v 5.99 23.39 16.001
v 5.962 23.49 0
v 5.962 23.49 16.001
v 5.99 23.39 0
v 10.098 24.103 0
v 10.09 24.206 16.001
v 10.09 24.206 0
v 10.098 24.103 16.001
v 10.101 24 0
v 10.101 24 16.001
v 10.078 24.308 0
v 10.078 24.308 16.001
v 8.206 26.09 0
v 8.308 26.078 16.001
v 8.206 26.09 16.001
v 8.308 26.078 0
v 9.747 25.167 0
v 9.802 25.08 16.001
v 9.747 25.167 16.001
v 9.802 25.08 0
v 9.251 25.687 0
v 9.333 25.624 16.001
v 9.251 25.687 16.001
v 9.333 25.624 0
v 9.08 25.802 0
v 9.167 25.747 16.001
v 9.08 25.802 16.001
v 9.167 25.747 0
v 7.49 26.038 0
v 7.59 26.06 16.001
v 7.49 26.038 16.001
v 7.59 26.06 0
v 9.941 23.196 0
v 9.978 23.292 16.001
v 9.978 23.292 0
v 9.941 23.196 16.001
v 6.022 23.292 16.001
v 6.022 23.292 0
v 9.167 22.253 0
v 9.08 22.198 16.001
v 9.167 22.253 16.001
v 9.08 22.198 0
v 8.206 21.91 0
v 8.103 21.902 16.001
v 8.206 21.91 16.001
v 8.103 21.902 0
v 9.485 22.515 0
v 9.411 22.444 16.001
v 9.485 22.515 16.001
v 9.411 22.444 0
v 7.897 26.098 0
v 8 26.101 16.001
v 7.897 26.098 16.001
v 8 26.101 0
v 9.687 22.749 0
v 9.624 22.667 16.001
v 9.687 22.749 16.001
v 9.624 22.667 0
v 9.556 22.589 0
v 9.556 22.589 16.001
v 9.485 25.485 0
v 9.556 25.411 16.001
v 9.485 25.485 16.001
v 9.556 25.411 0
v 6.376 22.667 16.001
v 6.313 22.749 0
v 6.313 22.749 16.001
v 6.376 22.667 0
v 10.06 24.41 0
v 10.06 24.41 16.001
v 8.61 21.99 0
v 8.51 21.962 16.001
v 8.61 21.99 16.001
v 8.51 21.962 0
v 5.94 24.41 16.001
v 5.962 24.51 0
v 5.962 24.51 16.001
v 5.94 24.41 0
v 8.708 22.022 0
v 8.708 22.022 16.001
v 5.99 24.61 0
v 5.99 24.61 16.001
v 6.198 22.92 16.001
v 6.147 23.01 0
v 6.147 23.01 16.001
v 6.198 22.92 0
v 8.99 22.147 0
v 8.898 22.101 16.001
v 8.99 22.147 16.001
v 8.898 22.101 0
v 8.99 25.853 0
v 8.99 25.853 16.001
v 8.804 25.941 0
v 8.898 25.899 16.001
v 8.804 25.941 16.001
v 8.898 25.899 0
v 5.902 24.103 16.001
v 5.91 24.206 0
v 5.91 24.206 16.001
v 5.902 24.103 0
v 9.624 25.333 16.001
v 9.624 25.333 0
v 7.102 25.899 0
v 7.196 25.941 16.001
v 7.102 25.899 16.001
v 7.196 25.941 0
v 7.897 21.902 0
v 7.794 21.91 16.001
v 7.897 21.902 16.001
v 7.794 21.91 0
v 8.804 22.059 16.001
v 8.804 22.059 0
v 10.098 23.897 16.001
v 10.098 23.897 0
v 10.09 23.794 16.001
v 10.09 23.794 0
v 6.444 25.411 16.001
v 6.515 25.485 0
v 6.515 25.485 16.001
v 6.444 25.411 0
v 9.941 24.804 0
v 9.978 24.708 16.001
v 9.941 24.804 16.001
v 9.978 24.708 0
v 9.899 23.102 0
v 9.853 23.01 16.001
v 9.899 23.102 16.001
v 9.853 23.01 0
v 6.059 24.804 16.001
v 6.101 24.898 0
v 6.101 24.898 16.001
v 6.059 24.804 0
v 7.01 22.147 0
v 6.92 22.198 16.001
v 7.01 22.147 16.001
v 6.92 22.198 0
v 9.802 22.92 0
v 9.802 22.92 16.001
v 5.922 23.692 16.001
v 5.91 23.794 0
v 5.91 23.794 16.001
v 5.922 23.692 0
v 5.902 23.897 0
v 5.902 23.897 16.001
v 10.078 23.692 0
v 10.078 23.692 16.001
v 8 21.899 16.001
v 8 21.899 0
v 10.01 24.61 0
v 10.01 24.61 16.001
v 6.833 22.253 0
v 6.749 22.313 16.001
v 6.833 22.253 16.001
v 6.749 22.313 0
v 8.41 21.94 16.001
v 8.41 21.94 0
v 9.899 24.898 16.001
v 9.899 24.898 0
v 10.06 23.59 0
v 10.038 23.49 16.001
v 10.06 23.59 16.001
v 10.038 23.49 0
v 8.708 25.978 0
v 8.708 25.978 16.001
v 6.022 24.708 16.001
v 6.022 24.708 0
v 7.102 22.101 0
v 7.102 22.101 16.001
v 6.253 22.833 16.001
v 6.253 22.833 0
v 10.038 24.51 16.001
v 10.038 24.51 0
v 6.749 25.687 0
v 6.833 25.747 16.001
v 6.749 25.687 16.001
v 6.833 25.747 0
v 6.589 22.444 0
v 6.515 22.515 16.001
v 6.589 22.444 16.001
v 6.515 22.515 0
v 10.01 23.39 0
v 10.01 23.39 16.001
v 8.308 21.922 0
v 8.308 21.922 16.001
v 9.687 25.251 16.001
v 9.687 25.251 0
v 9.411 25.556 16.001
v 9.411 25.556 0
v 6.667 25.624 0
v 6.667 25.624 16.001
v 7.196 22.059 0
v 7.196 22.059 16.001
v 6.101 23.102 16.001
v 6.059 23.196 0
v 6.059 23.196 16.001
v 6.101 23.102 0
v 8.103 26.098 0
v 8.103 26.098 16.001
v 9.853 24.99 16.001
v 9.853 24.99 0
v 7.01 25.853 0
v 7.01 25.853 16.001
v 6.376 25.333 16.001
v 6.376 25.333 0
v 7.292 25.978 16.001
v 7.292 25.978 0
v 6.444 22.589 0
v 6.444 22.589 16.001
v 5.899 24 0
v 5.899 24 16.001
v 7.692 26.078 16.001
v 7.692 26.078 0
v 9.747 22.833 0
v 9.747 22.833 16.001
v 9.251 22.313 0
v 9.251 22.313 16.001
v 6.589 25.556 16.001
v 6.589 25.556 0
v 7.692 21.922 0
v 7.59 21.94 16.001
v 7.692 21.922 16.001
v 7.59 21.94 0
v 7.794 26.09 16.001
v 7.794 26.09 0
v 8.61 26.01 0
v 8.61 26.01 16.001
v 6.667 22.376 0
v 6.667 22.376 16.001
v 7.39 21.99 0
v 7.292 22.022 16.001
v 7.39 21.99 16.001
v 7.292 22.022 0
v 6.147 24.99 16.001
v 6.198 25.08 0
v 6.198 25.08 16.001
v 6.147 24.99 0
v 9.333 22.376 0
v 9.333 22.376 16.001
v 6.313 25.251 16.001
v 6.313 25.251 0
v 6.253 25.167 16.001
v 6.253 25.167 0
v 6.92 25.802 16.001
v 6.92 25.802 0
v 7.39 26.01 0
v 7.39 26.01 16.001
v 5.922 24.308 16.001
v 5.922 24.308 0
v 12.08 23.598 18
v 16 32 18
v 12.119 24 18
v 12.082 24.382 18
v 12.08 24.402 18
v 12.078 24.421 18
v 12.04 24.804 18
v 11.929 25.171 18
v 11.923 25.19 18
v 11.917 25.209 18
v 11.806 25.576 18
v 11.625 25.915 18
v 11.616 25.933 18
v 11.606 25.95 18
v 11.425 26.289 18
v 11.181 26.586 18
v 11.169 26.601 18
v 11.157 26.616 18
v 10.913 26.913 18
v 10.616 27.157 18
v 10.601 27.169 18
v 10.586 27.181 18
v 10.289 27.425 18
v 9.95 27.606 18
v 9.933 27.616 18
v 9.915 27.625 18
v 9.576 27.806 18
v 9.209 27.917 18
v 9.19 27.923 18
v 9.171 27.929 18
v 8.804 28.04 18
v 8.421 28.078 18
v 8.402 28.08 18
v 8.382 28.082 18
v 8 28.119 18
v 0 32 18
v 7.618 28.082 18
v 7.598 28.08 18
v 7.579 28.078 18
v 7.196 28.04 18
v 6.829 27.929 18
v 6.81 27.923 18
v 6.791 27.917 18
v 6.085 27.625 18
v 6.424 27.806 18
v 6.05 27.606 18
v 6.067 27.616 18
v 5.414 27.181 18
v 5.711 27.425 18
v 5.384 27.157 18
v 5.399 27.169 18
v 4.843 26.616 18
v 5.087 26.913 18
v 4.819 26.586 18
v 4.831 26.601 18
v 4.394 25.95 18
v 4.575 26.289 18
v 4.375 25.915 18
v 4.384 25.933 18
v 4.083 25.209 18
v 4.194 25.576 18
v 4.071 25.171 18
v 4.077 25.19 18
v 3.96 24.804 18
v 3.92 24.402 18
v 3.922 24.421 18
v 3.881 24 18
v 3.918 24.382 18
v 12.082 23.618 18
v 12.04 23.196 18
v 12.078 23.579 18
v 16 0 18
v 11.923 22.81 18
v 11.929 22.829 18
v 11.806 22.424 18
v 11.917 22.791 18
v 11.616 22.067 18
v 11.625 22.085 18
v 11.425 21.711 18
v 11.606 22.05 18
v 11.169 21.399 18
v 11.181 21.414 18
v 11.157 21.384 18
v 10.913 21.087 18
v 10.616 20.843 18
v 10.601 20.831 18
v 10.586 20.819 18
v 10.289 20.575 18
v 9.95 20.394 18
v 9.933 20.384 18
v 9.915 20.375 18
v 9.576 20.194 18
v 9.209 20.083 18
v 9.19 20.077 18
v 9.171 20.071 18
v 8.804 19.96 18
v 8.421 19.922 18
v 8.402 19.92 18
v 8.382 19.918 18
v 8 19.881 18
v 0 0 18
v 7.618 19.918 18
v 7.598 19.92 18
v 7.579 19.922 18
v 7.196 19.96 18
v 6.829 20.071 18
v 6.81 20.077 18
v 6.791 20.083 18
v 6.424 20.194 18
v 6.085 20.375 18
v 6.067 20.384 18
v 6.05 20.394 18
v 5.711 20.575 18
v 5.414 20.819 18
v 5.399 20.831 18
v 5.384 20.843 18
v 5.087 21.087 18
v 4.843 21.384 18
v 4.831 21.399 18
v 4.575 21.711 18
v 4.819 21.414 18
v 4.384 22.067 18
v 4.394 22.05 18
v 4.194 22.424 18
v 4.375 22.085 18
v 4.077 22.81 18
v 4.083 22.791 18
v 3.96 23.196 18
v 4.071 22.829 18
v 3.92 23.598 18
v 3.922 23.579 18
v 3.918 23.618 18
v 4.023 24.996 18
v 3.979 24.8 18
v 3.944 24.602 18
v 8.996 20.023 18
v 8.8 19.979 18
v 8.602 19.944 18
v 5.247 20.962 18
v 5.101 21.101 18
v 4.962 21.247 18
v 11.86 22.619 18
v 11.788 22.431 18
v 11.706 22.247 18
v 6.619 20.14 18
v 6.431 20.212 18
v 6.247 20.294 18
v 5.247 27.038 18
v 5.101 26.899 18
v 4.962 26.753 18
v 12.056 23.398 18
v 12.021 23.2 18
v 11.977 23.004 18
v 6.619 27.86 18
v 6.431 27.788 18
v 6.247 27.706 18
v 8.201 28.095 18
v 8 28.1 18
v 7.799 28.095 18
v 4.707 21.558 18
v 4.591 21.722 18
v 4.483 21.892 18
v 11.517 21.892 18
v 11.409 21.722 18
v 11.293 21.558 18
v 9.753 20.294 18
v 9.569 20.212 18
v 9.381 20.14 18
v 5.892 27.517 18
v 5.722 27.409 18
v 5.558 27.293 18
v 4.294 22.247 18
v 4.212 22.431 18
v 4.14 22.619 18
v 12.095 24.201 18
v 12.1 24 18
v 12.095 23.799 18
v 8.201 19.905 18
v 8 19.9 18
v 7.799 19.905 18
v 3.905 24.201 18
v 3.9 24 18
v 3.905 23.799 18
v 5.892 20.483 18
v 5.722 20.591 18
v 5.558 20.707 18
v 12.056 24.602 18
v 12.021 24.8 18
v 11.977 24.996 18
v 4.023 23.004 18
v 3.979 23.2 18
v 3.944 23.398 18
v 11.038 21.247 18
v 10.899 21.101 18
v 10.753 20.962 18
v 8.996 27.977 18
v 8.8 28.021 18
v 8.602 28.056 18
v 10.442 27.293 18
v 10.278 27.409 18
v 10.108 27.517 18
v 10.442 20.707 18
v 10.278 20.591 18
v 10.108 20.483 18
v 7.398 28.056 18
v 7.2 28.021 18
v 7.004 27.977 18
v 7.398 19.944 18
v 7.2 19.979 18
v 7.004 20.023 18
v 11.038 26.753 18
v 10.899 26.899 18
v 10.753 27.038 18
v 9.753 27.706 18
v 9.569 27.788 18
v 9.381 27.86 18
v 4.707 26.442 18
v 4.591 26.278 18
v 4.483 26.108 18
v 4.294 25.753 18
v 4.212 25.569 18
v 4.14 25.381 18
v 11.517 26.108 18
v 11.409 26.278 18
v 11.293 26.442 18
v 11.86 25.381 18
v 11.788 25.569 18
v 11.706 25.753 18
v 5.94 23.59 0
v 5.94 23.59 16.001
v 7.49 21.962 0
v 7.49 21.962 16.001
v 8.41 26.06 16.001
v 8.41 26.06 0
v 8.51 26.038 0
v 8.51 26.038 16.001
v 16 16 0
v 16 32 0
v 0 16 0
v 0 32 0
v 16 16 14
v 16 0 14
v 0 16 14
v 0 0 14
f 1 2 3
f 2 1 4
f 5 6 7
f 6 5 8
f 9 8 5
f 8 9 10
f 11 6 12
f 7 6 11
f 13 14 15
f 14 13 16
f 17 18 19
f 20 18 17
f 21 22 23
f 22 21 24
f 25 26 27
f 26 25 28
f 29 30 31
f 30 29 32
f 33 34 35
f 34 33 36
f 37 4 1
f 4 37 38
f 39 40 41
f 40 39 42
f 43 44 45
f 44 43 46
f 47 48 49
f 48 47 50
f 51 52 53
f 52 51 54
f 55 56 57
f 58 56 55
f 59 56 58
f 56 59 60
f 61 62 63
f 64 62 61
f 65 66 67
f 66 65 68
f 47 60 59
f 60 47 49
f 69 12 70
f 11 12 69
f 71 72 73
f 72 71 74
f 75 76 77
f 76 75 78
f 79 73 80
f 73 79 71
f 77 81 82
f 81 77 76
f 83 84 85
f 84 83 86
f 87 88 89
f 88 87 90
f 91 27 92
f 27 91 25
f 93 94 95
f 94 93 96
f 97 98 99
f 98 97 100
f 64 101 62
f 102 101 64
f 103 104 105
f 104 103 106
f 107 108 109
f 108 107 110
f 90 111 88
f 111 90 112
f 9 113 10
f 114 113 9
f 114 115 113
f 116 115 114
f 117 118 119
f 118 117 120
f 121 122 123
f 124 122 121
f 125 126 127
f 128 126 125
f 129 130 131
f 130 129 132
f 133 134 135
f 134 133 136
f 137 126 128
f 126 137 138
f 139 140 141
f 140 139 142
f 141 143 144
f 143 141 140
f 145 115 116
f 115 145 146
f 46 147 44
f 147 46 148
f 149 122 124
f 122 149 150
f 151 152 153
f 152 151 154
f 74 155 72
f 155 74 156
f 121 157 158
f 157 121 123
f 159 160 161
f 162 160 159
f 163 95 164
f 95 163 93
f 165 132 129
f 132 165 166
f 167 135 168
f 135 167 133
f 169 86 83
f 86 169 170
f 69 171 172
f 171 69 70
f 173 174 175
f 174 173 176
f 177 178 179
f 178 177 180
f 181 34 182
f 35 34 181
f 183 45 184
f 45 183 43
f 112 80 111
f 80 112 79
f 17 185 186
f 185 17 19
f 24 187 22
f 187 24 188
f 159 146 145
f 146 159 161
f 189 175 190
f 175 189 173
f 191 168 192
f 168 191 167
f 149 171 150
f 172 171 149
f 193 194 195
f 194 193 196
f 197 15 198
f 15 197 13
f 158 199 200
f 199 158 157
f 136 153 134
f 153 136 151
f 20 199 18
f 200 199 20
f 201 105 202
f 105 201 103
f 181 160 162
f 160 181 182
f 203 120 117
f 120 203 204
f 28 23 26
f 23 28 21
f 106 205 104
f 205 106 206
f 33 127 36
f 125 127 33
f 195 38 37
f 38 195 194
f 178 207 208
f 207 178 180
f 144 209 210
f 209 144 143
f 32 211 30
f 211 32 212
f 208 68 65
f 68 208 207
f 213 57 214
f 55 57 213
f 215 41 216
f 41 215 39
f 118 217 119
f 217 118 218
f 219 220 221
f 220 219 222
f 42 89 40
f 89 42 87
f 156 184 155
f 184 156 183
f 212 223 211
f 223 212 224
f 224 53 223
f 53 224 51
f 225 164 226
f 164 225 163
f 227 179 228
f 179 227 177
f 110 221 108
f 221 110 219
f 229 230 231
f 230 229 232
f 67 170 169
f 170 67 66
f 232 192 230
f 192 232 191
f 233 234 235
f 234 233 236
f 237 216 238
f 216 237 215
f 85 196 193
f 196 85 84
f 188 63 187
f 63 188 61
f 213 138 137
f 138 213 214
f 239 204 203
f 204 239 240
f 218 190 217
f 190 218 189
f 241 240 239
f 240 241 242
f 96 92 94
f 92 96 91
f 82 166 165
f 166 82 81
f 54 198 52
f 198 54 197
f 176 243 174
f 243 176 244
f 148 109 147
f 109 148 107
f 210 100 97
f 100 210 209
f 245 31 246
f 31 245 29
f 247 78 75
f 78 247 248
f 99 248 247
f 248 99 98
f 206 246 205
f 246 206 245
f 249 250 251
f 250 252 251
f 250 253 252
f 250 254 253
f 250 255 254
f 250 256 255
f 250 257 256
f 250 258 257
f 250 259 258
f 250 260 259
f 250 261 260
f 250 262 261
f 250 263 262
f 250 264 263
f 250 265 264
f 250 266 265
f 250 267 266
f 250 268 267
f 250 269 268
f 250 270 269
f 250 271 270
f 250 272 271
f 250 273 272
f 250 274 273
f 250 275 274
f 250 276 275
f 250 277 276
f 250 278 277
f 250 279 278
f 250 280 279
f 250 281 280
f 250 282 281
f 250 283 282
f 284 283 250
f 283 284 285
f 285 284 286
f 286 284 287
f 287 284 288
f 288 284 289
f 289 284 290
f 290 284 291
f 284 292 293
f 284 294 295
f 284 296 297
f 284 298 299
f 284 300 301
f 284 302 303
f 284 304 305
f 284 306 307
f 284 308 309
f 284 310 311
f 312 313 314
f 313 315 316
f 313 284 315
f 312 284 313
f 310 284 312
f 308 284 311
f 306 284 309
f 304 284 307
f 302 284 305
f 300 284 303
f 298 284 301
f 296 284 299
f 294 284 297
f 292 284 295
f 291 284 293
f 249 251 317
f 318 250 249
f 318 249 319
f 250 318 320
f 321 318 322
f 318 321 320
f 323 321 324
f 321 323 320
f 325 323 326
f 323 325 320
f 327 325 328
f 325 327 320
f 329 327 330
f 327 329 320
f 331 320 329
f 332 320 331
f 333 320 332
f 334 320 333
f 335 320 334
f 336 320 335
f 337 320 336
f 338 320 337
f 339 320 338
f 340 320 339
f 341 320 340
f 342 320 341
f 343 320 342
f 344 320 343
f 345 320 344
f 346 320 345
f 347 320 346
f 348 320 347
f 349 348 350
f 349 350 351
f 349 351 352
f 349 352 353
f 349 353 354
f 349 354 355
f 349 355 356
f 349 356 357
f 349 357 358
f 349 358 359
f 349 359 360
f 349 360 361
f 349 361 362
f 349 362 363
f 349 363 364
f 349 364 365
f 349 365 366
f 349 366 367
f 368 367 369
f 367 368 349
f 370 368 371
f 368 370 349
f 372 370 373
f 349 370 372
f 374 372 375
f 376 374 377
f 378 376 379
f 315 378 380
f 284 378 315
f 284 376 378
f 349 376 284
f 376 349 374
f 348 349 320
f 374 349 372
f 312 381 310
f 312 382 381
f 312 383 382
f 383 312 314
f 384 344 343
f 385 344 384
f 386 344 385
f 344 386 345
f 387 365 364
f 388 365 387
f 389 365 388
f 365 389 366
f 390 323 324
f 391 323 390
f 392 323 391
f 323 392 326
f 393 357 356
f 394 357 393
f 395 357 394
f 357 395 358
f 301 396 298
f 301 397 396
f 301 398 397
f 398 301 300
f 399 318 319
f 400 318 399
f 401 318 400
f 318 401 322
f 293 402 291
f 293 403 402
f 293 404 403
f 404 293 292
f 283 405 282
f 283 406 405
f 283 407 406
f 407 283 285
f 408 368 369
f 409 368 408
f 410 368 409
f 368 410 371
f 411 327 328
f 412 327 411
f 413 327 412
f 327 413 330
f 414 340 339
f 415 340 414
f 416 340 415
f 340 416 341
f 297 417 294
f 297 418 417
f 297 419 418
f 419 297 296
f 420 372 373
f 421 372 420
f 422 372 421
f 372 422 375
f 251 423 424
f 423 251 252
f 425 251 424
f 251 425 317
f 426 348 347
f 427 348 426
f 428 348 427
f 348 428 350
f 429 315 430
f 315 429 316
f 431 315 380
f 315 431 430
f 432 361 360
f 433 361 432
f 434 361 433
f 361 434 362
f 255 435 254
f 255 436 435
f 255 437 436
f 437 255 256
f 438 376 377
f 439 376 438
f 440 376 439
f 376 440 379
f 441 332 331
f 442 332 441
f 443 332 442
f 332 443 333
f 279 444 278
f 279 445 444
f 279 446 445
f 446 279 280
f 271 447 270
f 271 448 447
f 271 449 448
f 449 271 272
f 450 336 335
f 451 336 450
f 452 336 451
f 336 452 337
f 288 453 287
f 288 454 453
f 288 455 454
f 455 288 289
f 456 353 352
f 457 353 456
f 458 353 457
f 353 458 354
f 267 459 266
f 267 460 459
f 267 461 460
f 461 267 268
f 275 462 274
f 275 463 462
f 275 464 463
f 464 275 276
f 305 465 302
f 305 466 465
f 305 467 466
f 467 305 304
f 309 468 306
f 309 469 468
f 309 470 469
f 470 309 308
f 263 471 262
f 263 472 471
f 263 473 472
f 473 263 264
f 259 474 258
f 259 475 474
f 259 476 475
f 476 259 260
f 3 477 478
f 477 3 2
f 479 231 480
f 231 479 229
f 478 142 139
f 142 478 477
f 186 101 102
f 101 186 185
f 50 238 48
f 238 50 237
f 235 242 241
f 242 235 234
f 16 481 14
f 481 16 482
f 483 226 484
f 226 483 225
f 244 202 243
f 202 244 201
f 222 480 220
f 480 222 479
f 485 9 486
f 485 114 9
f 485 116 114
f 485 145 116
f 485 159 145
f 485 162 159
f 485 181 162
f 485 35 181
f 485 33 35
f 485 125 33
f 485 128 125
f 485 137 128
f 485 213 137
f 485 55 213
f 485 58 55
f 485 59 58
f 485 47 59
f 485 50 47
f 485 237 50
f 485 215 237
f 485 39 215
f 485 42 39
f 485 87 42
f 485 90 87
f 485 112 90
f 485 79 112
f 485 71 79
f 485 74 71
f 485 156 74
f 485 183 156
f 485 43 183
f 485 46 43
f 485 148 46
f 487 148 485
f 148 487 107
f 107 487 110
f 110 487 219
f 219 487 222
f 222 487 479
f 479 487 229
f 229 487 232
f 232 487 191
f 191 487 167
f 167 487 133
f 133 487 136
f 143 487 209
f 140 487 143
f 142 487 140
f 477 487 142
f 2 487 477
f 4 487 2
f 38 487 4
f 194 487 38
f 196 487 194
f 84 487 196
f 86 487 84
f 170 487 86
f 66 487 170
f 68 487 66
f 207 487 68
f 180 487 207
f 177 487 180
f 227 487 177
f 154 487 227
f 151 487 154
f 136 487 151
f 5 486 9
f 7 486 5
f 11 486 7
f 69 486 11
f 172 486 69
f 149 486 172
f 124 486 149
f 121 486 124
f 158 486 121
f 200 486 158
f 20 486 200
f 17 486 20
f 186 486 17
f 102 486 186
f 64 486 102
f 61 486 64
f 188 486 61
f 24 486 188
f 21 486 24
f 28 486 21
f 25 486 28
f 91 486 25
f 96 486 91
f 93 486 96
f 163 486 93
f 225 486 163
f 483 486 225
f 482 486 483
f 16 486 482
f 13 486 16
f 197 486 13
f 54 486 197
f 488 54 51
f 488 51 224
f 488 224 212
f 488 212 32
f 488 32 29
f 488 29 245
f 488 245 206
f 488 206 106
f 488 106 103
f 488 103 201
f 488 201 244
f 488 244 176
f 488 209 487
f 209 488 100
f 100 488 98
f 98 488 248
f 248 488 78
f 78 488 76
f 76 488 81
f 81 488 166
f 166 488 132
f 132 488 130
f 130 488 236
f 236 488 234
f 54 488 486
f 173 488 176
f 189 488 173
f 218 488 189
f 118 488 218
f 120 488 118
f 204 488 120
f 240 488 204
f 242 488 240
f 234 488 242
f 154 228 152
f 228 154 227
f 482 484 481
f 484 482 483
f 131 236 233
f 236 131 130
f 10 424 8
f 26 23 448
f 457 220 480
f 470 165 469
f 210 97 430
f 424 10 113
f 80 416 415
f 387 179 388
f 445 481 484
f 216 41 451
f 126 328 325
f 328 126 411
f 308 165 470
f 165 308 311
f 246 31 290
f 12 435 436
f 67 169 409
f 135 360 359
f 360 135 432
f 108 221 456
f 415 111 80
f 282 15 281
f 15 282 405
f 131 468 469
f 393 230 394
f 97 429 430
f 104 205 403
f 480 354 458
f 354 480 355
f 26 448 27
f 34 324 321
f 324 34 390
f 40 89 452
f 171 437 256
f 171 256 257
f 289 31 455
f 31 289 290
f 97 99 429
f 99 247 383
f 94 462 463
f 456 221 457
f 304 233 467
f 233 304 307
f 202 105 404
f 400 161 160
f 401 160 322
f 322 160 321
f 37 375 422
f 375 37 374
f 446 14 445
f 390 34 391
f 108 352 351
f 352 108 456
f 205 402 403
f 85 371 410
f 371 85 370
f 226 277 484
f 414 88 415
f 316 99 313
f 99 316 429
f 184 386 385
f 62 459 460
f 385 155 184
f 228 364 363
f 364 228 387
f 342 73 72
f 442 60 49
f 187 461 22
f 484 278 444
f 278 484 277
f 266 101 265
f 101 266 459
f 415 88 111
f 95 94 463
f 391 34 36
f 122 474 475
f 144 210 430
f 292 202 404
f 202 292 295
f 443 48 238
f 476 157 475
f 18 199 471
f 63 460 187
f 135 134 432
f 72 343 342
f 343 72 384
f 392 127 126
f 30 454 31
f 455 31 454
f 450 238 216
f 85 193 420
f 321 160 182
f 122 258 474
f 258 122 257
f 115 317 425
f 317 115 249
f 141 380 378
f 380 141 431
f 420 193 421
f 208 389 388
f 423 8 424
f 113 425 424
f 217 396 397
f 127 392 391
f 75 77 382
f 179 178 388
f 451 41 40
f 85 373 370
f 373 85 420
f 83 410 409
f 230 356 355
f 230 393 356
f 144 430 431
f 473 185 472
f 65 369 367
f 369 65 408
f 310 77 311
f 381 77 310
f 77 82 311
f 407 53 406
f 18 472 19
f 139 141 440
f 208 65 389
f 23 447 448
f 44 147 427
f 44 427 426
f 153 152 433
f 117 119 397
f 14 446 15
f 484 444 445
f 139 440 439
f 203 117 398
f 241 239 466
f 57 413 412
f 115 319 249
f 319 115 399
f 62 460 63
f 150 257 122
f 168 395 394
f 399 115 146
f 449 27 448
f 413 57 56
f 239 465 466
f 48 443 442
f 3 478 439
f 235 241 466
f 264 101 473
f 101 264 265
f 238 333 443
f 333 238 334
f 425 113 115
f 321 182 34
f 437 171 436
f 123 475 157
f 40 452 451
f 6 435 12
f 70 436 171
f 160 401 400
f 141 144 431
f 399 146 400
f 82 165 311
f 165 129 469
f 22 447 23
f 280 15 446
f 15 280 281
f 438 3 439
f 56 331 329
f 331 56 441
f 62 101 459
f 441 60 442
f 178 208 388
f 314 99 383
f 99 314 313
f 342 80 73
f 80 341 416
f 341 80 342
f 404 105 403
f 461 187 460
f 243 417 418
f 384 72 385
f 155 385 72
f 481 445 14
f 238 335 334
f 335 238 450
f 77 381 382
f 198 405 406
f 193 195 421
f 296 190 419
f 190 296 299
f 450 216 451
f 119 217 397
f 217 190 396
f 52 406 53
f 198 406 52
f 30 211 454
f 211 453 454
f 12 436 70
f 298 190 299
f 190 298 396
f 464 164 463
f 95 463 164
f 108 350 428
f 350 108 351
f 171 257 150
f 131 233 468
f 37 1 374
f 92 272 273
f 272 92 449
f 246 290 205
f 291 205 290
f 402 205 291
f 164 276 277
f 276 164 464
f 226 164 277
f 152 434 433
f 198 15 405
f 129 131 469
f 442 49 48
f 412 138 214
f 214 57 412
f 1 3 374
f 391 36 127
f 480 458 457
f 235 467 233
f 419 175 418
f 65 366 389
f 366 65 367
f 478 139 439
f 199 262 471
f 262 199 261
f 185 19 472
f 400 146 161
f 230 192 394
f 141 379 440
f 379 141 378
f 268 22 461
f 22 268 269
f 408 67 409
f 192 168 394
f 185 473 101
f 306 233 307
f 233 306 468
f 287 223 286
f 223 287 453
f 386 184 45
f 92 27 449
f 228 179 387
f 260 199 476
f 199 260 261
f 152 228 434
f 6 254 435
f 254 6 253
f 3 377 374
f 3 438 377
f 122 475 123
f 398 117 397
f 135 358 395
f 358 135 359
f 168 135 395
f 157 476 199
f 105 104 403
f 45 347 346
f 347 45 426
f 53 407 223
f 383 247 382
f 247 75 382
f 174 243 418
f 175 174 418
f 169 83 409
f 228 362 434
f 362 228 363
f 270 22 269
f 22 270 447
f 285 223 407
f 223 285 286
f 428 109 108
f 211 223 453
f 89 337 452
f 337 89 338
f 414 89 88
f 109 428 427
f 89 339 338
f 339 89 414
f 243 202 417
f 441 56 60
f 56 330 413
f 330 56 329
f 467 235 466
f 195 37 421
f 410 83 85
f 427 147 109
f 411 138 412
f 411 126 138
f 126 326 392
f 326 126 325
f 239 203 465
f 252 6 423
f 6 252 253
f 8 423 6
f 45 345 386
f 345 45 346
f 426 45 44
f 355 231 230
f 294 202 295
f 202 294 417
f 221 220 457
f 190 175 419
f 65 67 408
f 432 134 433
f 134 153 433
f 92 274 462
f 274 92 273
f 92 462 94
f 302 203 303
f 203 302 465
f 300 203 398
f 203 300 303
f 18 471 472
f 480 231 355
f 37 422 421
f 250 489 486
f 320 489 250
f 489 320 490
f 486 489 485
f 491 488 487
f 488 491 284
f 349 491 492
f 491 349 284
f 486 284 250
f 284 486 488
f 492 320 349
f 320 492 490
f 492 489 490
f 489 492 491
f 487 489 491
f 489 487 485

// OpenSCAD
// file: bolts.scad
$radial_error = 0.1;

$fn = $preview ? 24 : 128;

ISO262_COARSE_PITCH = [
	[1.0, 0.25],
	[1.2, 0.25],
	[1.4, 0.2],
	[1.6, 0.35],
	[1.8, 0.2],
	[2.0, 0.4],
	[2.5, 0.45],
	[3.0, 0.5],
	[3.5, 0.35],
	[4.0, 0.7],
	[5.0, 0.8],
	[6.0, 1.0],
	[7.0, 0.75],
	[8.0, 1.25],
	[10.0, 1.5],
	[12.0, 1.75],
	[14.0, 1.5],
	[16.0, 2.0],
	[30.0, 3.5],
	[42.0, 4.5],
	[56.0, 5.5]
];

function screw_pitch(d) = lookup(d, ISO262_COARSE_PITCH);

function fudge_factor(fn=$fn) = 1/cos(180/fn);
function outer_radius(radius, fn=$fn, radial_error=$radial_error) = radius*fudge_factor(fn)+radial_error;

module sphere_outer(radius, fn=$fn, radial_error=$radial_error) {
	sphere(r=radius*fudge_factor(fn)+radial_error, $fn=fn);
}

module cylinder_outer(height, radius, fn=$fn, radial_error=$radial_error) {
	cylinder(h=height,r=radius*fudge_factor(fn)+radial_error, $fn=fn);
}

module cylinder_inner(height, radius, fn=$fn, radial_error=$radial_error) {
	cylinder(h=height,r=radius-radial_error,$fn=fn);
}

// Make a hole. The diameter is the size of the screw (e.g. 3 for M3). Depth is how far the hole should go for the thread, and inset is how far out there should be a hole for the head to go.
module hole(diameter=3, depth=6, inset=10, pitch=0) {
	cylinder_outer(depth, (diameter-pitch)/2);
	
	if (inset) {
		translate([0, 0, depth]) cylinder_outer(inset, diameter, 32);
	}
}

module threaded_hole(diameter=3, depth=6, inset=10) {
	hole(diameter, depth, inset, screw_pitch(diameter));
}

module screw_hole(diameter = 3, depth = 16, inset = 10, thickness = 6) {
	insert = depth - thickness;
	pitch = screw_pitch(diameter);
	
	// The part that the screw will thread into:
	cylinder_outer(insert, (diameter-pitch)/2);
	
	translate([0, 0, insert])
	hole(diameter, depth - insert, inset);
}

module countersunk_screw_hole(diameter = 3, depth = 16, inset = 10, thickness = 6) {
	insert = depth - thickness;
	pitch = screw_pitch(diameter);
	
	// The part that the screw will thread into:
	cylinder_outer(insert, (diameter-pitch)/2);
	
	translate([0, 0, insert])
	countersunk_hole(diameter, depth - insert, inset);
}

module countersunk_hole(diameter=3, depth=6, inset=10, pitch=0, radial_error=$radial_error) {
	hole(diameter, depth, inset, pitch);
	translate([0, 0, depth-diameter/2]) cylinder(r1=diameter/2+radial_error, r2=diameter+radial_error, h=diameter/2);
}

module knurled_insert(diameter = 3, depth = 6, thickness = 1) {
	cylinder_inner(depth, diameter/2 + thickness);
}

module knurled_hole(diameter = 3, depth = 6, inset = 10, insert = 4, thickness = 1) {
	hole(diameter, depth, inset);
	
	knurled_insert(diameter, insert, thickness);
}

module countersunk_knurled_hole(diameter = 3, depth = 6, inset = 10, insert = 4, thickness = 1) {
	countersunk_hole(diameter, depth, inset);
	
	knurled_insert(diameter, insert, thickness);
}

// Make a hole for a bolt/screw combination.
module bolted_hole(diameter=3, depth=8, nut_offset=2, shaft_length=10, inset=10) {
	hole(diameter, depth, inset);
	hull() {
		shaft_width = diameter;
		translate([0, 0, nut_offset]) rotate(360/12, [0, 0, 1]) cylinder_outer(diameter, shaft_width, 6);
		translate([0, shaft_length, nut_offset]) rotate(360/12, [0, 0, 1]) cylinder_outer(diameter, shaft_width, 6);
	}
}

module countersunk_bolted_hole(diameter=3, depth=8, nut_offset=2, shaft_length=10, inset=10) {
	countersunk_hole(diameter, depth, inset);
	hull() {
		shaft_width = diameter;
		translate([0, 0, nut_offset]) rotate(360/12, [0, 0, 1]) cylinder_outer(diameter, shaft_width, 6);
		translate([0, shaft_length, nut_offset]) rotate(360/12, [0, 0, 1]) cylinder_outer(diameter, shaft_width, 6);
	}
}

module mounting_hole(diameter=3, depth=6, inset=10, outset=3) {
	difference() {
		cylinder_outer(depth, diameter/2+outset);
		hole(diameter=diameter, depth=depth, inset=inset);
	}
}

!render() rotate(90, [1, 0, 0]) difference() {
	cube([40, 10, 10]);
	translate([5, 5, 0]) screw_hole();
}

render() rotate(90, [1, 0, 0]) difference() {
	cube([40, 10, 10]);
	translate([5, 5, 0]) bolted_hole(diameter=3, depth=8);
	translate([15, 5, 0]) bolted_hole(diameter=4, depth=8);
	translate([25, 5, 0]) countersunk_hole(diameter=4, depth=8);
	translate([35, 5, 0]) knurled_hole();
}

render() rotate(90, [1, 0, 0]) difference() {
	cube([6*4, 12, 12]);
	translate([6, 6, 0]) hole(diameter=5, depth=8);
	translate([6*3, 6, 0]) hole(diameter=5.5, depth=8);
}
// file: zcube.scad
$fn = $preview ? 24 : 128;

// This function creates a cube with a given x/y either above (f=1) or below (f=-1) the z axis.
module zcube(dimensions, z=0, f=1) {
	translate([0, 0, dimensions[2]/2 * f + z]) cube(dimensions, true);
}

module zring(dimensions, thickness, z=0, f=1) {
	render() difference() {
		zcube([dimensions[0]+thickness/2, dimensions[1]+thickness/2, dimensions[2]], z=z, f=f);
		zcube([dimensions[0]-thickness/2, dimensions[1]-thickness/2, dimensions[2]], z=z, f=f);
	}
}

module rcube(dimensions, d = 1, z=0, f=1) {
	dx = dimensions[0]/2 - d/2;
	dy = dimensions[1]/2 - d/2;
	dz = dimensions[2]/2 * (f-1) + z;
	
	hull() {
		translate([-dx, -dy, dz]) cylinder(h=dimensions[2], d=d);
		translate([-dx, dy, dz]) cylinder(h=dimensions[2], d=d);
		translate([dx, -dy, dz]) cylinder(h=dimensions[2], d=d);
		translate([dx, dy, dz]) cylinder(h=dimensions[2], d=d);
	}
}

module zcorners() {
	children();
	mirror([1, 0, 0]) children();
	mirror([0, 1, 0]) children();
	mirror([1, 0, 0]) mirror([0, 1, 0]) children();
}

module reflect(axis = [1, 0, 0]) {
	children();
	mirror(axis) children();
}

module zsides(dimensions, thickness, inset=0) {
	difference() {
		zcube(dimensions + [thickness*2, thickness*2, 0]);
		zcube(dimensions);
	}
}
// main file
use <zcube.scad>;
use <bolts.scad>;

difference() {
	cube([16, 32, 18]);
	cube([16, 16, 14]);
	
	translate([8, 24, 0])
	countersunk_hole(4, 18);
}
